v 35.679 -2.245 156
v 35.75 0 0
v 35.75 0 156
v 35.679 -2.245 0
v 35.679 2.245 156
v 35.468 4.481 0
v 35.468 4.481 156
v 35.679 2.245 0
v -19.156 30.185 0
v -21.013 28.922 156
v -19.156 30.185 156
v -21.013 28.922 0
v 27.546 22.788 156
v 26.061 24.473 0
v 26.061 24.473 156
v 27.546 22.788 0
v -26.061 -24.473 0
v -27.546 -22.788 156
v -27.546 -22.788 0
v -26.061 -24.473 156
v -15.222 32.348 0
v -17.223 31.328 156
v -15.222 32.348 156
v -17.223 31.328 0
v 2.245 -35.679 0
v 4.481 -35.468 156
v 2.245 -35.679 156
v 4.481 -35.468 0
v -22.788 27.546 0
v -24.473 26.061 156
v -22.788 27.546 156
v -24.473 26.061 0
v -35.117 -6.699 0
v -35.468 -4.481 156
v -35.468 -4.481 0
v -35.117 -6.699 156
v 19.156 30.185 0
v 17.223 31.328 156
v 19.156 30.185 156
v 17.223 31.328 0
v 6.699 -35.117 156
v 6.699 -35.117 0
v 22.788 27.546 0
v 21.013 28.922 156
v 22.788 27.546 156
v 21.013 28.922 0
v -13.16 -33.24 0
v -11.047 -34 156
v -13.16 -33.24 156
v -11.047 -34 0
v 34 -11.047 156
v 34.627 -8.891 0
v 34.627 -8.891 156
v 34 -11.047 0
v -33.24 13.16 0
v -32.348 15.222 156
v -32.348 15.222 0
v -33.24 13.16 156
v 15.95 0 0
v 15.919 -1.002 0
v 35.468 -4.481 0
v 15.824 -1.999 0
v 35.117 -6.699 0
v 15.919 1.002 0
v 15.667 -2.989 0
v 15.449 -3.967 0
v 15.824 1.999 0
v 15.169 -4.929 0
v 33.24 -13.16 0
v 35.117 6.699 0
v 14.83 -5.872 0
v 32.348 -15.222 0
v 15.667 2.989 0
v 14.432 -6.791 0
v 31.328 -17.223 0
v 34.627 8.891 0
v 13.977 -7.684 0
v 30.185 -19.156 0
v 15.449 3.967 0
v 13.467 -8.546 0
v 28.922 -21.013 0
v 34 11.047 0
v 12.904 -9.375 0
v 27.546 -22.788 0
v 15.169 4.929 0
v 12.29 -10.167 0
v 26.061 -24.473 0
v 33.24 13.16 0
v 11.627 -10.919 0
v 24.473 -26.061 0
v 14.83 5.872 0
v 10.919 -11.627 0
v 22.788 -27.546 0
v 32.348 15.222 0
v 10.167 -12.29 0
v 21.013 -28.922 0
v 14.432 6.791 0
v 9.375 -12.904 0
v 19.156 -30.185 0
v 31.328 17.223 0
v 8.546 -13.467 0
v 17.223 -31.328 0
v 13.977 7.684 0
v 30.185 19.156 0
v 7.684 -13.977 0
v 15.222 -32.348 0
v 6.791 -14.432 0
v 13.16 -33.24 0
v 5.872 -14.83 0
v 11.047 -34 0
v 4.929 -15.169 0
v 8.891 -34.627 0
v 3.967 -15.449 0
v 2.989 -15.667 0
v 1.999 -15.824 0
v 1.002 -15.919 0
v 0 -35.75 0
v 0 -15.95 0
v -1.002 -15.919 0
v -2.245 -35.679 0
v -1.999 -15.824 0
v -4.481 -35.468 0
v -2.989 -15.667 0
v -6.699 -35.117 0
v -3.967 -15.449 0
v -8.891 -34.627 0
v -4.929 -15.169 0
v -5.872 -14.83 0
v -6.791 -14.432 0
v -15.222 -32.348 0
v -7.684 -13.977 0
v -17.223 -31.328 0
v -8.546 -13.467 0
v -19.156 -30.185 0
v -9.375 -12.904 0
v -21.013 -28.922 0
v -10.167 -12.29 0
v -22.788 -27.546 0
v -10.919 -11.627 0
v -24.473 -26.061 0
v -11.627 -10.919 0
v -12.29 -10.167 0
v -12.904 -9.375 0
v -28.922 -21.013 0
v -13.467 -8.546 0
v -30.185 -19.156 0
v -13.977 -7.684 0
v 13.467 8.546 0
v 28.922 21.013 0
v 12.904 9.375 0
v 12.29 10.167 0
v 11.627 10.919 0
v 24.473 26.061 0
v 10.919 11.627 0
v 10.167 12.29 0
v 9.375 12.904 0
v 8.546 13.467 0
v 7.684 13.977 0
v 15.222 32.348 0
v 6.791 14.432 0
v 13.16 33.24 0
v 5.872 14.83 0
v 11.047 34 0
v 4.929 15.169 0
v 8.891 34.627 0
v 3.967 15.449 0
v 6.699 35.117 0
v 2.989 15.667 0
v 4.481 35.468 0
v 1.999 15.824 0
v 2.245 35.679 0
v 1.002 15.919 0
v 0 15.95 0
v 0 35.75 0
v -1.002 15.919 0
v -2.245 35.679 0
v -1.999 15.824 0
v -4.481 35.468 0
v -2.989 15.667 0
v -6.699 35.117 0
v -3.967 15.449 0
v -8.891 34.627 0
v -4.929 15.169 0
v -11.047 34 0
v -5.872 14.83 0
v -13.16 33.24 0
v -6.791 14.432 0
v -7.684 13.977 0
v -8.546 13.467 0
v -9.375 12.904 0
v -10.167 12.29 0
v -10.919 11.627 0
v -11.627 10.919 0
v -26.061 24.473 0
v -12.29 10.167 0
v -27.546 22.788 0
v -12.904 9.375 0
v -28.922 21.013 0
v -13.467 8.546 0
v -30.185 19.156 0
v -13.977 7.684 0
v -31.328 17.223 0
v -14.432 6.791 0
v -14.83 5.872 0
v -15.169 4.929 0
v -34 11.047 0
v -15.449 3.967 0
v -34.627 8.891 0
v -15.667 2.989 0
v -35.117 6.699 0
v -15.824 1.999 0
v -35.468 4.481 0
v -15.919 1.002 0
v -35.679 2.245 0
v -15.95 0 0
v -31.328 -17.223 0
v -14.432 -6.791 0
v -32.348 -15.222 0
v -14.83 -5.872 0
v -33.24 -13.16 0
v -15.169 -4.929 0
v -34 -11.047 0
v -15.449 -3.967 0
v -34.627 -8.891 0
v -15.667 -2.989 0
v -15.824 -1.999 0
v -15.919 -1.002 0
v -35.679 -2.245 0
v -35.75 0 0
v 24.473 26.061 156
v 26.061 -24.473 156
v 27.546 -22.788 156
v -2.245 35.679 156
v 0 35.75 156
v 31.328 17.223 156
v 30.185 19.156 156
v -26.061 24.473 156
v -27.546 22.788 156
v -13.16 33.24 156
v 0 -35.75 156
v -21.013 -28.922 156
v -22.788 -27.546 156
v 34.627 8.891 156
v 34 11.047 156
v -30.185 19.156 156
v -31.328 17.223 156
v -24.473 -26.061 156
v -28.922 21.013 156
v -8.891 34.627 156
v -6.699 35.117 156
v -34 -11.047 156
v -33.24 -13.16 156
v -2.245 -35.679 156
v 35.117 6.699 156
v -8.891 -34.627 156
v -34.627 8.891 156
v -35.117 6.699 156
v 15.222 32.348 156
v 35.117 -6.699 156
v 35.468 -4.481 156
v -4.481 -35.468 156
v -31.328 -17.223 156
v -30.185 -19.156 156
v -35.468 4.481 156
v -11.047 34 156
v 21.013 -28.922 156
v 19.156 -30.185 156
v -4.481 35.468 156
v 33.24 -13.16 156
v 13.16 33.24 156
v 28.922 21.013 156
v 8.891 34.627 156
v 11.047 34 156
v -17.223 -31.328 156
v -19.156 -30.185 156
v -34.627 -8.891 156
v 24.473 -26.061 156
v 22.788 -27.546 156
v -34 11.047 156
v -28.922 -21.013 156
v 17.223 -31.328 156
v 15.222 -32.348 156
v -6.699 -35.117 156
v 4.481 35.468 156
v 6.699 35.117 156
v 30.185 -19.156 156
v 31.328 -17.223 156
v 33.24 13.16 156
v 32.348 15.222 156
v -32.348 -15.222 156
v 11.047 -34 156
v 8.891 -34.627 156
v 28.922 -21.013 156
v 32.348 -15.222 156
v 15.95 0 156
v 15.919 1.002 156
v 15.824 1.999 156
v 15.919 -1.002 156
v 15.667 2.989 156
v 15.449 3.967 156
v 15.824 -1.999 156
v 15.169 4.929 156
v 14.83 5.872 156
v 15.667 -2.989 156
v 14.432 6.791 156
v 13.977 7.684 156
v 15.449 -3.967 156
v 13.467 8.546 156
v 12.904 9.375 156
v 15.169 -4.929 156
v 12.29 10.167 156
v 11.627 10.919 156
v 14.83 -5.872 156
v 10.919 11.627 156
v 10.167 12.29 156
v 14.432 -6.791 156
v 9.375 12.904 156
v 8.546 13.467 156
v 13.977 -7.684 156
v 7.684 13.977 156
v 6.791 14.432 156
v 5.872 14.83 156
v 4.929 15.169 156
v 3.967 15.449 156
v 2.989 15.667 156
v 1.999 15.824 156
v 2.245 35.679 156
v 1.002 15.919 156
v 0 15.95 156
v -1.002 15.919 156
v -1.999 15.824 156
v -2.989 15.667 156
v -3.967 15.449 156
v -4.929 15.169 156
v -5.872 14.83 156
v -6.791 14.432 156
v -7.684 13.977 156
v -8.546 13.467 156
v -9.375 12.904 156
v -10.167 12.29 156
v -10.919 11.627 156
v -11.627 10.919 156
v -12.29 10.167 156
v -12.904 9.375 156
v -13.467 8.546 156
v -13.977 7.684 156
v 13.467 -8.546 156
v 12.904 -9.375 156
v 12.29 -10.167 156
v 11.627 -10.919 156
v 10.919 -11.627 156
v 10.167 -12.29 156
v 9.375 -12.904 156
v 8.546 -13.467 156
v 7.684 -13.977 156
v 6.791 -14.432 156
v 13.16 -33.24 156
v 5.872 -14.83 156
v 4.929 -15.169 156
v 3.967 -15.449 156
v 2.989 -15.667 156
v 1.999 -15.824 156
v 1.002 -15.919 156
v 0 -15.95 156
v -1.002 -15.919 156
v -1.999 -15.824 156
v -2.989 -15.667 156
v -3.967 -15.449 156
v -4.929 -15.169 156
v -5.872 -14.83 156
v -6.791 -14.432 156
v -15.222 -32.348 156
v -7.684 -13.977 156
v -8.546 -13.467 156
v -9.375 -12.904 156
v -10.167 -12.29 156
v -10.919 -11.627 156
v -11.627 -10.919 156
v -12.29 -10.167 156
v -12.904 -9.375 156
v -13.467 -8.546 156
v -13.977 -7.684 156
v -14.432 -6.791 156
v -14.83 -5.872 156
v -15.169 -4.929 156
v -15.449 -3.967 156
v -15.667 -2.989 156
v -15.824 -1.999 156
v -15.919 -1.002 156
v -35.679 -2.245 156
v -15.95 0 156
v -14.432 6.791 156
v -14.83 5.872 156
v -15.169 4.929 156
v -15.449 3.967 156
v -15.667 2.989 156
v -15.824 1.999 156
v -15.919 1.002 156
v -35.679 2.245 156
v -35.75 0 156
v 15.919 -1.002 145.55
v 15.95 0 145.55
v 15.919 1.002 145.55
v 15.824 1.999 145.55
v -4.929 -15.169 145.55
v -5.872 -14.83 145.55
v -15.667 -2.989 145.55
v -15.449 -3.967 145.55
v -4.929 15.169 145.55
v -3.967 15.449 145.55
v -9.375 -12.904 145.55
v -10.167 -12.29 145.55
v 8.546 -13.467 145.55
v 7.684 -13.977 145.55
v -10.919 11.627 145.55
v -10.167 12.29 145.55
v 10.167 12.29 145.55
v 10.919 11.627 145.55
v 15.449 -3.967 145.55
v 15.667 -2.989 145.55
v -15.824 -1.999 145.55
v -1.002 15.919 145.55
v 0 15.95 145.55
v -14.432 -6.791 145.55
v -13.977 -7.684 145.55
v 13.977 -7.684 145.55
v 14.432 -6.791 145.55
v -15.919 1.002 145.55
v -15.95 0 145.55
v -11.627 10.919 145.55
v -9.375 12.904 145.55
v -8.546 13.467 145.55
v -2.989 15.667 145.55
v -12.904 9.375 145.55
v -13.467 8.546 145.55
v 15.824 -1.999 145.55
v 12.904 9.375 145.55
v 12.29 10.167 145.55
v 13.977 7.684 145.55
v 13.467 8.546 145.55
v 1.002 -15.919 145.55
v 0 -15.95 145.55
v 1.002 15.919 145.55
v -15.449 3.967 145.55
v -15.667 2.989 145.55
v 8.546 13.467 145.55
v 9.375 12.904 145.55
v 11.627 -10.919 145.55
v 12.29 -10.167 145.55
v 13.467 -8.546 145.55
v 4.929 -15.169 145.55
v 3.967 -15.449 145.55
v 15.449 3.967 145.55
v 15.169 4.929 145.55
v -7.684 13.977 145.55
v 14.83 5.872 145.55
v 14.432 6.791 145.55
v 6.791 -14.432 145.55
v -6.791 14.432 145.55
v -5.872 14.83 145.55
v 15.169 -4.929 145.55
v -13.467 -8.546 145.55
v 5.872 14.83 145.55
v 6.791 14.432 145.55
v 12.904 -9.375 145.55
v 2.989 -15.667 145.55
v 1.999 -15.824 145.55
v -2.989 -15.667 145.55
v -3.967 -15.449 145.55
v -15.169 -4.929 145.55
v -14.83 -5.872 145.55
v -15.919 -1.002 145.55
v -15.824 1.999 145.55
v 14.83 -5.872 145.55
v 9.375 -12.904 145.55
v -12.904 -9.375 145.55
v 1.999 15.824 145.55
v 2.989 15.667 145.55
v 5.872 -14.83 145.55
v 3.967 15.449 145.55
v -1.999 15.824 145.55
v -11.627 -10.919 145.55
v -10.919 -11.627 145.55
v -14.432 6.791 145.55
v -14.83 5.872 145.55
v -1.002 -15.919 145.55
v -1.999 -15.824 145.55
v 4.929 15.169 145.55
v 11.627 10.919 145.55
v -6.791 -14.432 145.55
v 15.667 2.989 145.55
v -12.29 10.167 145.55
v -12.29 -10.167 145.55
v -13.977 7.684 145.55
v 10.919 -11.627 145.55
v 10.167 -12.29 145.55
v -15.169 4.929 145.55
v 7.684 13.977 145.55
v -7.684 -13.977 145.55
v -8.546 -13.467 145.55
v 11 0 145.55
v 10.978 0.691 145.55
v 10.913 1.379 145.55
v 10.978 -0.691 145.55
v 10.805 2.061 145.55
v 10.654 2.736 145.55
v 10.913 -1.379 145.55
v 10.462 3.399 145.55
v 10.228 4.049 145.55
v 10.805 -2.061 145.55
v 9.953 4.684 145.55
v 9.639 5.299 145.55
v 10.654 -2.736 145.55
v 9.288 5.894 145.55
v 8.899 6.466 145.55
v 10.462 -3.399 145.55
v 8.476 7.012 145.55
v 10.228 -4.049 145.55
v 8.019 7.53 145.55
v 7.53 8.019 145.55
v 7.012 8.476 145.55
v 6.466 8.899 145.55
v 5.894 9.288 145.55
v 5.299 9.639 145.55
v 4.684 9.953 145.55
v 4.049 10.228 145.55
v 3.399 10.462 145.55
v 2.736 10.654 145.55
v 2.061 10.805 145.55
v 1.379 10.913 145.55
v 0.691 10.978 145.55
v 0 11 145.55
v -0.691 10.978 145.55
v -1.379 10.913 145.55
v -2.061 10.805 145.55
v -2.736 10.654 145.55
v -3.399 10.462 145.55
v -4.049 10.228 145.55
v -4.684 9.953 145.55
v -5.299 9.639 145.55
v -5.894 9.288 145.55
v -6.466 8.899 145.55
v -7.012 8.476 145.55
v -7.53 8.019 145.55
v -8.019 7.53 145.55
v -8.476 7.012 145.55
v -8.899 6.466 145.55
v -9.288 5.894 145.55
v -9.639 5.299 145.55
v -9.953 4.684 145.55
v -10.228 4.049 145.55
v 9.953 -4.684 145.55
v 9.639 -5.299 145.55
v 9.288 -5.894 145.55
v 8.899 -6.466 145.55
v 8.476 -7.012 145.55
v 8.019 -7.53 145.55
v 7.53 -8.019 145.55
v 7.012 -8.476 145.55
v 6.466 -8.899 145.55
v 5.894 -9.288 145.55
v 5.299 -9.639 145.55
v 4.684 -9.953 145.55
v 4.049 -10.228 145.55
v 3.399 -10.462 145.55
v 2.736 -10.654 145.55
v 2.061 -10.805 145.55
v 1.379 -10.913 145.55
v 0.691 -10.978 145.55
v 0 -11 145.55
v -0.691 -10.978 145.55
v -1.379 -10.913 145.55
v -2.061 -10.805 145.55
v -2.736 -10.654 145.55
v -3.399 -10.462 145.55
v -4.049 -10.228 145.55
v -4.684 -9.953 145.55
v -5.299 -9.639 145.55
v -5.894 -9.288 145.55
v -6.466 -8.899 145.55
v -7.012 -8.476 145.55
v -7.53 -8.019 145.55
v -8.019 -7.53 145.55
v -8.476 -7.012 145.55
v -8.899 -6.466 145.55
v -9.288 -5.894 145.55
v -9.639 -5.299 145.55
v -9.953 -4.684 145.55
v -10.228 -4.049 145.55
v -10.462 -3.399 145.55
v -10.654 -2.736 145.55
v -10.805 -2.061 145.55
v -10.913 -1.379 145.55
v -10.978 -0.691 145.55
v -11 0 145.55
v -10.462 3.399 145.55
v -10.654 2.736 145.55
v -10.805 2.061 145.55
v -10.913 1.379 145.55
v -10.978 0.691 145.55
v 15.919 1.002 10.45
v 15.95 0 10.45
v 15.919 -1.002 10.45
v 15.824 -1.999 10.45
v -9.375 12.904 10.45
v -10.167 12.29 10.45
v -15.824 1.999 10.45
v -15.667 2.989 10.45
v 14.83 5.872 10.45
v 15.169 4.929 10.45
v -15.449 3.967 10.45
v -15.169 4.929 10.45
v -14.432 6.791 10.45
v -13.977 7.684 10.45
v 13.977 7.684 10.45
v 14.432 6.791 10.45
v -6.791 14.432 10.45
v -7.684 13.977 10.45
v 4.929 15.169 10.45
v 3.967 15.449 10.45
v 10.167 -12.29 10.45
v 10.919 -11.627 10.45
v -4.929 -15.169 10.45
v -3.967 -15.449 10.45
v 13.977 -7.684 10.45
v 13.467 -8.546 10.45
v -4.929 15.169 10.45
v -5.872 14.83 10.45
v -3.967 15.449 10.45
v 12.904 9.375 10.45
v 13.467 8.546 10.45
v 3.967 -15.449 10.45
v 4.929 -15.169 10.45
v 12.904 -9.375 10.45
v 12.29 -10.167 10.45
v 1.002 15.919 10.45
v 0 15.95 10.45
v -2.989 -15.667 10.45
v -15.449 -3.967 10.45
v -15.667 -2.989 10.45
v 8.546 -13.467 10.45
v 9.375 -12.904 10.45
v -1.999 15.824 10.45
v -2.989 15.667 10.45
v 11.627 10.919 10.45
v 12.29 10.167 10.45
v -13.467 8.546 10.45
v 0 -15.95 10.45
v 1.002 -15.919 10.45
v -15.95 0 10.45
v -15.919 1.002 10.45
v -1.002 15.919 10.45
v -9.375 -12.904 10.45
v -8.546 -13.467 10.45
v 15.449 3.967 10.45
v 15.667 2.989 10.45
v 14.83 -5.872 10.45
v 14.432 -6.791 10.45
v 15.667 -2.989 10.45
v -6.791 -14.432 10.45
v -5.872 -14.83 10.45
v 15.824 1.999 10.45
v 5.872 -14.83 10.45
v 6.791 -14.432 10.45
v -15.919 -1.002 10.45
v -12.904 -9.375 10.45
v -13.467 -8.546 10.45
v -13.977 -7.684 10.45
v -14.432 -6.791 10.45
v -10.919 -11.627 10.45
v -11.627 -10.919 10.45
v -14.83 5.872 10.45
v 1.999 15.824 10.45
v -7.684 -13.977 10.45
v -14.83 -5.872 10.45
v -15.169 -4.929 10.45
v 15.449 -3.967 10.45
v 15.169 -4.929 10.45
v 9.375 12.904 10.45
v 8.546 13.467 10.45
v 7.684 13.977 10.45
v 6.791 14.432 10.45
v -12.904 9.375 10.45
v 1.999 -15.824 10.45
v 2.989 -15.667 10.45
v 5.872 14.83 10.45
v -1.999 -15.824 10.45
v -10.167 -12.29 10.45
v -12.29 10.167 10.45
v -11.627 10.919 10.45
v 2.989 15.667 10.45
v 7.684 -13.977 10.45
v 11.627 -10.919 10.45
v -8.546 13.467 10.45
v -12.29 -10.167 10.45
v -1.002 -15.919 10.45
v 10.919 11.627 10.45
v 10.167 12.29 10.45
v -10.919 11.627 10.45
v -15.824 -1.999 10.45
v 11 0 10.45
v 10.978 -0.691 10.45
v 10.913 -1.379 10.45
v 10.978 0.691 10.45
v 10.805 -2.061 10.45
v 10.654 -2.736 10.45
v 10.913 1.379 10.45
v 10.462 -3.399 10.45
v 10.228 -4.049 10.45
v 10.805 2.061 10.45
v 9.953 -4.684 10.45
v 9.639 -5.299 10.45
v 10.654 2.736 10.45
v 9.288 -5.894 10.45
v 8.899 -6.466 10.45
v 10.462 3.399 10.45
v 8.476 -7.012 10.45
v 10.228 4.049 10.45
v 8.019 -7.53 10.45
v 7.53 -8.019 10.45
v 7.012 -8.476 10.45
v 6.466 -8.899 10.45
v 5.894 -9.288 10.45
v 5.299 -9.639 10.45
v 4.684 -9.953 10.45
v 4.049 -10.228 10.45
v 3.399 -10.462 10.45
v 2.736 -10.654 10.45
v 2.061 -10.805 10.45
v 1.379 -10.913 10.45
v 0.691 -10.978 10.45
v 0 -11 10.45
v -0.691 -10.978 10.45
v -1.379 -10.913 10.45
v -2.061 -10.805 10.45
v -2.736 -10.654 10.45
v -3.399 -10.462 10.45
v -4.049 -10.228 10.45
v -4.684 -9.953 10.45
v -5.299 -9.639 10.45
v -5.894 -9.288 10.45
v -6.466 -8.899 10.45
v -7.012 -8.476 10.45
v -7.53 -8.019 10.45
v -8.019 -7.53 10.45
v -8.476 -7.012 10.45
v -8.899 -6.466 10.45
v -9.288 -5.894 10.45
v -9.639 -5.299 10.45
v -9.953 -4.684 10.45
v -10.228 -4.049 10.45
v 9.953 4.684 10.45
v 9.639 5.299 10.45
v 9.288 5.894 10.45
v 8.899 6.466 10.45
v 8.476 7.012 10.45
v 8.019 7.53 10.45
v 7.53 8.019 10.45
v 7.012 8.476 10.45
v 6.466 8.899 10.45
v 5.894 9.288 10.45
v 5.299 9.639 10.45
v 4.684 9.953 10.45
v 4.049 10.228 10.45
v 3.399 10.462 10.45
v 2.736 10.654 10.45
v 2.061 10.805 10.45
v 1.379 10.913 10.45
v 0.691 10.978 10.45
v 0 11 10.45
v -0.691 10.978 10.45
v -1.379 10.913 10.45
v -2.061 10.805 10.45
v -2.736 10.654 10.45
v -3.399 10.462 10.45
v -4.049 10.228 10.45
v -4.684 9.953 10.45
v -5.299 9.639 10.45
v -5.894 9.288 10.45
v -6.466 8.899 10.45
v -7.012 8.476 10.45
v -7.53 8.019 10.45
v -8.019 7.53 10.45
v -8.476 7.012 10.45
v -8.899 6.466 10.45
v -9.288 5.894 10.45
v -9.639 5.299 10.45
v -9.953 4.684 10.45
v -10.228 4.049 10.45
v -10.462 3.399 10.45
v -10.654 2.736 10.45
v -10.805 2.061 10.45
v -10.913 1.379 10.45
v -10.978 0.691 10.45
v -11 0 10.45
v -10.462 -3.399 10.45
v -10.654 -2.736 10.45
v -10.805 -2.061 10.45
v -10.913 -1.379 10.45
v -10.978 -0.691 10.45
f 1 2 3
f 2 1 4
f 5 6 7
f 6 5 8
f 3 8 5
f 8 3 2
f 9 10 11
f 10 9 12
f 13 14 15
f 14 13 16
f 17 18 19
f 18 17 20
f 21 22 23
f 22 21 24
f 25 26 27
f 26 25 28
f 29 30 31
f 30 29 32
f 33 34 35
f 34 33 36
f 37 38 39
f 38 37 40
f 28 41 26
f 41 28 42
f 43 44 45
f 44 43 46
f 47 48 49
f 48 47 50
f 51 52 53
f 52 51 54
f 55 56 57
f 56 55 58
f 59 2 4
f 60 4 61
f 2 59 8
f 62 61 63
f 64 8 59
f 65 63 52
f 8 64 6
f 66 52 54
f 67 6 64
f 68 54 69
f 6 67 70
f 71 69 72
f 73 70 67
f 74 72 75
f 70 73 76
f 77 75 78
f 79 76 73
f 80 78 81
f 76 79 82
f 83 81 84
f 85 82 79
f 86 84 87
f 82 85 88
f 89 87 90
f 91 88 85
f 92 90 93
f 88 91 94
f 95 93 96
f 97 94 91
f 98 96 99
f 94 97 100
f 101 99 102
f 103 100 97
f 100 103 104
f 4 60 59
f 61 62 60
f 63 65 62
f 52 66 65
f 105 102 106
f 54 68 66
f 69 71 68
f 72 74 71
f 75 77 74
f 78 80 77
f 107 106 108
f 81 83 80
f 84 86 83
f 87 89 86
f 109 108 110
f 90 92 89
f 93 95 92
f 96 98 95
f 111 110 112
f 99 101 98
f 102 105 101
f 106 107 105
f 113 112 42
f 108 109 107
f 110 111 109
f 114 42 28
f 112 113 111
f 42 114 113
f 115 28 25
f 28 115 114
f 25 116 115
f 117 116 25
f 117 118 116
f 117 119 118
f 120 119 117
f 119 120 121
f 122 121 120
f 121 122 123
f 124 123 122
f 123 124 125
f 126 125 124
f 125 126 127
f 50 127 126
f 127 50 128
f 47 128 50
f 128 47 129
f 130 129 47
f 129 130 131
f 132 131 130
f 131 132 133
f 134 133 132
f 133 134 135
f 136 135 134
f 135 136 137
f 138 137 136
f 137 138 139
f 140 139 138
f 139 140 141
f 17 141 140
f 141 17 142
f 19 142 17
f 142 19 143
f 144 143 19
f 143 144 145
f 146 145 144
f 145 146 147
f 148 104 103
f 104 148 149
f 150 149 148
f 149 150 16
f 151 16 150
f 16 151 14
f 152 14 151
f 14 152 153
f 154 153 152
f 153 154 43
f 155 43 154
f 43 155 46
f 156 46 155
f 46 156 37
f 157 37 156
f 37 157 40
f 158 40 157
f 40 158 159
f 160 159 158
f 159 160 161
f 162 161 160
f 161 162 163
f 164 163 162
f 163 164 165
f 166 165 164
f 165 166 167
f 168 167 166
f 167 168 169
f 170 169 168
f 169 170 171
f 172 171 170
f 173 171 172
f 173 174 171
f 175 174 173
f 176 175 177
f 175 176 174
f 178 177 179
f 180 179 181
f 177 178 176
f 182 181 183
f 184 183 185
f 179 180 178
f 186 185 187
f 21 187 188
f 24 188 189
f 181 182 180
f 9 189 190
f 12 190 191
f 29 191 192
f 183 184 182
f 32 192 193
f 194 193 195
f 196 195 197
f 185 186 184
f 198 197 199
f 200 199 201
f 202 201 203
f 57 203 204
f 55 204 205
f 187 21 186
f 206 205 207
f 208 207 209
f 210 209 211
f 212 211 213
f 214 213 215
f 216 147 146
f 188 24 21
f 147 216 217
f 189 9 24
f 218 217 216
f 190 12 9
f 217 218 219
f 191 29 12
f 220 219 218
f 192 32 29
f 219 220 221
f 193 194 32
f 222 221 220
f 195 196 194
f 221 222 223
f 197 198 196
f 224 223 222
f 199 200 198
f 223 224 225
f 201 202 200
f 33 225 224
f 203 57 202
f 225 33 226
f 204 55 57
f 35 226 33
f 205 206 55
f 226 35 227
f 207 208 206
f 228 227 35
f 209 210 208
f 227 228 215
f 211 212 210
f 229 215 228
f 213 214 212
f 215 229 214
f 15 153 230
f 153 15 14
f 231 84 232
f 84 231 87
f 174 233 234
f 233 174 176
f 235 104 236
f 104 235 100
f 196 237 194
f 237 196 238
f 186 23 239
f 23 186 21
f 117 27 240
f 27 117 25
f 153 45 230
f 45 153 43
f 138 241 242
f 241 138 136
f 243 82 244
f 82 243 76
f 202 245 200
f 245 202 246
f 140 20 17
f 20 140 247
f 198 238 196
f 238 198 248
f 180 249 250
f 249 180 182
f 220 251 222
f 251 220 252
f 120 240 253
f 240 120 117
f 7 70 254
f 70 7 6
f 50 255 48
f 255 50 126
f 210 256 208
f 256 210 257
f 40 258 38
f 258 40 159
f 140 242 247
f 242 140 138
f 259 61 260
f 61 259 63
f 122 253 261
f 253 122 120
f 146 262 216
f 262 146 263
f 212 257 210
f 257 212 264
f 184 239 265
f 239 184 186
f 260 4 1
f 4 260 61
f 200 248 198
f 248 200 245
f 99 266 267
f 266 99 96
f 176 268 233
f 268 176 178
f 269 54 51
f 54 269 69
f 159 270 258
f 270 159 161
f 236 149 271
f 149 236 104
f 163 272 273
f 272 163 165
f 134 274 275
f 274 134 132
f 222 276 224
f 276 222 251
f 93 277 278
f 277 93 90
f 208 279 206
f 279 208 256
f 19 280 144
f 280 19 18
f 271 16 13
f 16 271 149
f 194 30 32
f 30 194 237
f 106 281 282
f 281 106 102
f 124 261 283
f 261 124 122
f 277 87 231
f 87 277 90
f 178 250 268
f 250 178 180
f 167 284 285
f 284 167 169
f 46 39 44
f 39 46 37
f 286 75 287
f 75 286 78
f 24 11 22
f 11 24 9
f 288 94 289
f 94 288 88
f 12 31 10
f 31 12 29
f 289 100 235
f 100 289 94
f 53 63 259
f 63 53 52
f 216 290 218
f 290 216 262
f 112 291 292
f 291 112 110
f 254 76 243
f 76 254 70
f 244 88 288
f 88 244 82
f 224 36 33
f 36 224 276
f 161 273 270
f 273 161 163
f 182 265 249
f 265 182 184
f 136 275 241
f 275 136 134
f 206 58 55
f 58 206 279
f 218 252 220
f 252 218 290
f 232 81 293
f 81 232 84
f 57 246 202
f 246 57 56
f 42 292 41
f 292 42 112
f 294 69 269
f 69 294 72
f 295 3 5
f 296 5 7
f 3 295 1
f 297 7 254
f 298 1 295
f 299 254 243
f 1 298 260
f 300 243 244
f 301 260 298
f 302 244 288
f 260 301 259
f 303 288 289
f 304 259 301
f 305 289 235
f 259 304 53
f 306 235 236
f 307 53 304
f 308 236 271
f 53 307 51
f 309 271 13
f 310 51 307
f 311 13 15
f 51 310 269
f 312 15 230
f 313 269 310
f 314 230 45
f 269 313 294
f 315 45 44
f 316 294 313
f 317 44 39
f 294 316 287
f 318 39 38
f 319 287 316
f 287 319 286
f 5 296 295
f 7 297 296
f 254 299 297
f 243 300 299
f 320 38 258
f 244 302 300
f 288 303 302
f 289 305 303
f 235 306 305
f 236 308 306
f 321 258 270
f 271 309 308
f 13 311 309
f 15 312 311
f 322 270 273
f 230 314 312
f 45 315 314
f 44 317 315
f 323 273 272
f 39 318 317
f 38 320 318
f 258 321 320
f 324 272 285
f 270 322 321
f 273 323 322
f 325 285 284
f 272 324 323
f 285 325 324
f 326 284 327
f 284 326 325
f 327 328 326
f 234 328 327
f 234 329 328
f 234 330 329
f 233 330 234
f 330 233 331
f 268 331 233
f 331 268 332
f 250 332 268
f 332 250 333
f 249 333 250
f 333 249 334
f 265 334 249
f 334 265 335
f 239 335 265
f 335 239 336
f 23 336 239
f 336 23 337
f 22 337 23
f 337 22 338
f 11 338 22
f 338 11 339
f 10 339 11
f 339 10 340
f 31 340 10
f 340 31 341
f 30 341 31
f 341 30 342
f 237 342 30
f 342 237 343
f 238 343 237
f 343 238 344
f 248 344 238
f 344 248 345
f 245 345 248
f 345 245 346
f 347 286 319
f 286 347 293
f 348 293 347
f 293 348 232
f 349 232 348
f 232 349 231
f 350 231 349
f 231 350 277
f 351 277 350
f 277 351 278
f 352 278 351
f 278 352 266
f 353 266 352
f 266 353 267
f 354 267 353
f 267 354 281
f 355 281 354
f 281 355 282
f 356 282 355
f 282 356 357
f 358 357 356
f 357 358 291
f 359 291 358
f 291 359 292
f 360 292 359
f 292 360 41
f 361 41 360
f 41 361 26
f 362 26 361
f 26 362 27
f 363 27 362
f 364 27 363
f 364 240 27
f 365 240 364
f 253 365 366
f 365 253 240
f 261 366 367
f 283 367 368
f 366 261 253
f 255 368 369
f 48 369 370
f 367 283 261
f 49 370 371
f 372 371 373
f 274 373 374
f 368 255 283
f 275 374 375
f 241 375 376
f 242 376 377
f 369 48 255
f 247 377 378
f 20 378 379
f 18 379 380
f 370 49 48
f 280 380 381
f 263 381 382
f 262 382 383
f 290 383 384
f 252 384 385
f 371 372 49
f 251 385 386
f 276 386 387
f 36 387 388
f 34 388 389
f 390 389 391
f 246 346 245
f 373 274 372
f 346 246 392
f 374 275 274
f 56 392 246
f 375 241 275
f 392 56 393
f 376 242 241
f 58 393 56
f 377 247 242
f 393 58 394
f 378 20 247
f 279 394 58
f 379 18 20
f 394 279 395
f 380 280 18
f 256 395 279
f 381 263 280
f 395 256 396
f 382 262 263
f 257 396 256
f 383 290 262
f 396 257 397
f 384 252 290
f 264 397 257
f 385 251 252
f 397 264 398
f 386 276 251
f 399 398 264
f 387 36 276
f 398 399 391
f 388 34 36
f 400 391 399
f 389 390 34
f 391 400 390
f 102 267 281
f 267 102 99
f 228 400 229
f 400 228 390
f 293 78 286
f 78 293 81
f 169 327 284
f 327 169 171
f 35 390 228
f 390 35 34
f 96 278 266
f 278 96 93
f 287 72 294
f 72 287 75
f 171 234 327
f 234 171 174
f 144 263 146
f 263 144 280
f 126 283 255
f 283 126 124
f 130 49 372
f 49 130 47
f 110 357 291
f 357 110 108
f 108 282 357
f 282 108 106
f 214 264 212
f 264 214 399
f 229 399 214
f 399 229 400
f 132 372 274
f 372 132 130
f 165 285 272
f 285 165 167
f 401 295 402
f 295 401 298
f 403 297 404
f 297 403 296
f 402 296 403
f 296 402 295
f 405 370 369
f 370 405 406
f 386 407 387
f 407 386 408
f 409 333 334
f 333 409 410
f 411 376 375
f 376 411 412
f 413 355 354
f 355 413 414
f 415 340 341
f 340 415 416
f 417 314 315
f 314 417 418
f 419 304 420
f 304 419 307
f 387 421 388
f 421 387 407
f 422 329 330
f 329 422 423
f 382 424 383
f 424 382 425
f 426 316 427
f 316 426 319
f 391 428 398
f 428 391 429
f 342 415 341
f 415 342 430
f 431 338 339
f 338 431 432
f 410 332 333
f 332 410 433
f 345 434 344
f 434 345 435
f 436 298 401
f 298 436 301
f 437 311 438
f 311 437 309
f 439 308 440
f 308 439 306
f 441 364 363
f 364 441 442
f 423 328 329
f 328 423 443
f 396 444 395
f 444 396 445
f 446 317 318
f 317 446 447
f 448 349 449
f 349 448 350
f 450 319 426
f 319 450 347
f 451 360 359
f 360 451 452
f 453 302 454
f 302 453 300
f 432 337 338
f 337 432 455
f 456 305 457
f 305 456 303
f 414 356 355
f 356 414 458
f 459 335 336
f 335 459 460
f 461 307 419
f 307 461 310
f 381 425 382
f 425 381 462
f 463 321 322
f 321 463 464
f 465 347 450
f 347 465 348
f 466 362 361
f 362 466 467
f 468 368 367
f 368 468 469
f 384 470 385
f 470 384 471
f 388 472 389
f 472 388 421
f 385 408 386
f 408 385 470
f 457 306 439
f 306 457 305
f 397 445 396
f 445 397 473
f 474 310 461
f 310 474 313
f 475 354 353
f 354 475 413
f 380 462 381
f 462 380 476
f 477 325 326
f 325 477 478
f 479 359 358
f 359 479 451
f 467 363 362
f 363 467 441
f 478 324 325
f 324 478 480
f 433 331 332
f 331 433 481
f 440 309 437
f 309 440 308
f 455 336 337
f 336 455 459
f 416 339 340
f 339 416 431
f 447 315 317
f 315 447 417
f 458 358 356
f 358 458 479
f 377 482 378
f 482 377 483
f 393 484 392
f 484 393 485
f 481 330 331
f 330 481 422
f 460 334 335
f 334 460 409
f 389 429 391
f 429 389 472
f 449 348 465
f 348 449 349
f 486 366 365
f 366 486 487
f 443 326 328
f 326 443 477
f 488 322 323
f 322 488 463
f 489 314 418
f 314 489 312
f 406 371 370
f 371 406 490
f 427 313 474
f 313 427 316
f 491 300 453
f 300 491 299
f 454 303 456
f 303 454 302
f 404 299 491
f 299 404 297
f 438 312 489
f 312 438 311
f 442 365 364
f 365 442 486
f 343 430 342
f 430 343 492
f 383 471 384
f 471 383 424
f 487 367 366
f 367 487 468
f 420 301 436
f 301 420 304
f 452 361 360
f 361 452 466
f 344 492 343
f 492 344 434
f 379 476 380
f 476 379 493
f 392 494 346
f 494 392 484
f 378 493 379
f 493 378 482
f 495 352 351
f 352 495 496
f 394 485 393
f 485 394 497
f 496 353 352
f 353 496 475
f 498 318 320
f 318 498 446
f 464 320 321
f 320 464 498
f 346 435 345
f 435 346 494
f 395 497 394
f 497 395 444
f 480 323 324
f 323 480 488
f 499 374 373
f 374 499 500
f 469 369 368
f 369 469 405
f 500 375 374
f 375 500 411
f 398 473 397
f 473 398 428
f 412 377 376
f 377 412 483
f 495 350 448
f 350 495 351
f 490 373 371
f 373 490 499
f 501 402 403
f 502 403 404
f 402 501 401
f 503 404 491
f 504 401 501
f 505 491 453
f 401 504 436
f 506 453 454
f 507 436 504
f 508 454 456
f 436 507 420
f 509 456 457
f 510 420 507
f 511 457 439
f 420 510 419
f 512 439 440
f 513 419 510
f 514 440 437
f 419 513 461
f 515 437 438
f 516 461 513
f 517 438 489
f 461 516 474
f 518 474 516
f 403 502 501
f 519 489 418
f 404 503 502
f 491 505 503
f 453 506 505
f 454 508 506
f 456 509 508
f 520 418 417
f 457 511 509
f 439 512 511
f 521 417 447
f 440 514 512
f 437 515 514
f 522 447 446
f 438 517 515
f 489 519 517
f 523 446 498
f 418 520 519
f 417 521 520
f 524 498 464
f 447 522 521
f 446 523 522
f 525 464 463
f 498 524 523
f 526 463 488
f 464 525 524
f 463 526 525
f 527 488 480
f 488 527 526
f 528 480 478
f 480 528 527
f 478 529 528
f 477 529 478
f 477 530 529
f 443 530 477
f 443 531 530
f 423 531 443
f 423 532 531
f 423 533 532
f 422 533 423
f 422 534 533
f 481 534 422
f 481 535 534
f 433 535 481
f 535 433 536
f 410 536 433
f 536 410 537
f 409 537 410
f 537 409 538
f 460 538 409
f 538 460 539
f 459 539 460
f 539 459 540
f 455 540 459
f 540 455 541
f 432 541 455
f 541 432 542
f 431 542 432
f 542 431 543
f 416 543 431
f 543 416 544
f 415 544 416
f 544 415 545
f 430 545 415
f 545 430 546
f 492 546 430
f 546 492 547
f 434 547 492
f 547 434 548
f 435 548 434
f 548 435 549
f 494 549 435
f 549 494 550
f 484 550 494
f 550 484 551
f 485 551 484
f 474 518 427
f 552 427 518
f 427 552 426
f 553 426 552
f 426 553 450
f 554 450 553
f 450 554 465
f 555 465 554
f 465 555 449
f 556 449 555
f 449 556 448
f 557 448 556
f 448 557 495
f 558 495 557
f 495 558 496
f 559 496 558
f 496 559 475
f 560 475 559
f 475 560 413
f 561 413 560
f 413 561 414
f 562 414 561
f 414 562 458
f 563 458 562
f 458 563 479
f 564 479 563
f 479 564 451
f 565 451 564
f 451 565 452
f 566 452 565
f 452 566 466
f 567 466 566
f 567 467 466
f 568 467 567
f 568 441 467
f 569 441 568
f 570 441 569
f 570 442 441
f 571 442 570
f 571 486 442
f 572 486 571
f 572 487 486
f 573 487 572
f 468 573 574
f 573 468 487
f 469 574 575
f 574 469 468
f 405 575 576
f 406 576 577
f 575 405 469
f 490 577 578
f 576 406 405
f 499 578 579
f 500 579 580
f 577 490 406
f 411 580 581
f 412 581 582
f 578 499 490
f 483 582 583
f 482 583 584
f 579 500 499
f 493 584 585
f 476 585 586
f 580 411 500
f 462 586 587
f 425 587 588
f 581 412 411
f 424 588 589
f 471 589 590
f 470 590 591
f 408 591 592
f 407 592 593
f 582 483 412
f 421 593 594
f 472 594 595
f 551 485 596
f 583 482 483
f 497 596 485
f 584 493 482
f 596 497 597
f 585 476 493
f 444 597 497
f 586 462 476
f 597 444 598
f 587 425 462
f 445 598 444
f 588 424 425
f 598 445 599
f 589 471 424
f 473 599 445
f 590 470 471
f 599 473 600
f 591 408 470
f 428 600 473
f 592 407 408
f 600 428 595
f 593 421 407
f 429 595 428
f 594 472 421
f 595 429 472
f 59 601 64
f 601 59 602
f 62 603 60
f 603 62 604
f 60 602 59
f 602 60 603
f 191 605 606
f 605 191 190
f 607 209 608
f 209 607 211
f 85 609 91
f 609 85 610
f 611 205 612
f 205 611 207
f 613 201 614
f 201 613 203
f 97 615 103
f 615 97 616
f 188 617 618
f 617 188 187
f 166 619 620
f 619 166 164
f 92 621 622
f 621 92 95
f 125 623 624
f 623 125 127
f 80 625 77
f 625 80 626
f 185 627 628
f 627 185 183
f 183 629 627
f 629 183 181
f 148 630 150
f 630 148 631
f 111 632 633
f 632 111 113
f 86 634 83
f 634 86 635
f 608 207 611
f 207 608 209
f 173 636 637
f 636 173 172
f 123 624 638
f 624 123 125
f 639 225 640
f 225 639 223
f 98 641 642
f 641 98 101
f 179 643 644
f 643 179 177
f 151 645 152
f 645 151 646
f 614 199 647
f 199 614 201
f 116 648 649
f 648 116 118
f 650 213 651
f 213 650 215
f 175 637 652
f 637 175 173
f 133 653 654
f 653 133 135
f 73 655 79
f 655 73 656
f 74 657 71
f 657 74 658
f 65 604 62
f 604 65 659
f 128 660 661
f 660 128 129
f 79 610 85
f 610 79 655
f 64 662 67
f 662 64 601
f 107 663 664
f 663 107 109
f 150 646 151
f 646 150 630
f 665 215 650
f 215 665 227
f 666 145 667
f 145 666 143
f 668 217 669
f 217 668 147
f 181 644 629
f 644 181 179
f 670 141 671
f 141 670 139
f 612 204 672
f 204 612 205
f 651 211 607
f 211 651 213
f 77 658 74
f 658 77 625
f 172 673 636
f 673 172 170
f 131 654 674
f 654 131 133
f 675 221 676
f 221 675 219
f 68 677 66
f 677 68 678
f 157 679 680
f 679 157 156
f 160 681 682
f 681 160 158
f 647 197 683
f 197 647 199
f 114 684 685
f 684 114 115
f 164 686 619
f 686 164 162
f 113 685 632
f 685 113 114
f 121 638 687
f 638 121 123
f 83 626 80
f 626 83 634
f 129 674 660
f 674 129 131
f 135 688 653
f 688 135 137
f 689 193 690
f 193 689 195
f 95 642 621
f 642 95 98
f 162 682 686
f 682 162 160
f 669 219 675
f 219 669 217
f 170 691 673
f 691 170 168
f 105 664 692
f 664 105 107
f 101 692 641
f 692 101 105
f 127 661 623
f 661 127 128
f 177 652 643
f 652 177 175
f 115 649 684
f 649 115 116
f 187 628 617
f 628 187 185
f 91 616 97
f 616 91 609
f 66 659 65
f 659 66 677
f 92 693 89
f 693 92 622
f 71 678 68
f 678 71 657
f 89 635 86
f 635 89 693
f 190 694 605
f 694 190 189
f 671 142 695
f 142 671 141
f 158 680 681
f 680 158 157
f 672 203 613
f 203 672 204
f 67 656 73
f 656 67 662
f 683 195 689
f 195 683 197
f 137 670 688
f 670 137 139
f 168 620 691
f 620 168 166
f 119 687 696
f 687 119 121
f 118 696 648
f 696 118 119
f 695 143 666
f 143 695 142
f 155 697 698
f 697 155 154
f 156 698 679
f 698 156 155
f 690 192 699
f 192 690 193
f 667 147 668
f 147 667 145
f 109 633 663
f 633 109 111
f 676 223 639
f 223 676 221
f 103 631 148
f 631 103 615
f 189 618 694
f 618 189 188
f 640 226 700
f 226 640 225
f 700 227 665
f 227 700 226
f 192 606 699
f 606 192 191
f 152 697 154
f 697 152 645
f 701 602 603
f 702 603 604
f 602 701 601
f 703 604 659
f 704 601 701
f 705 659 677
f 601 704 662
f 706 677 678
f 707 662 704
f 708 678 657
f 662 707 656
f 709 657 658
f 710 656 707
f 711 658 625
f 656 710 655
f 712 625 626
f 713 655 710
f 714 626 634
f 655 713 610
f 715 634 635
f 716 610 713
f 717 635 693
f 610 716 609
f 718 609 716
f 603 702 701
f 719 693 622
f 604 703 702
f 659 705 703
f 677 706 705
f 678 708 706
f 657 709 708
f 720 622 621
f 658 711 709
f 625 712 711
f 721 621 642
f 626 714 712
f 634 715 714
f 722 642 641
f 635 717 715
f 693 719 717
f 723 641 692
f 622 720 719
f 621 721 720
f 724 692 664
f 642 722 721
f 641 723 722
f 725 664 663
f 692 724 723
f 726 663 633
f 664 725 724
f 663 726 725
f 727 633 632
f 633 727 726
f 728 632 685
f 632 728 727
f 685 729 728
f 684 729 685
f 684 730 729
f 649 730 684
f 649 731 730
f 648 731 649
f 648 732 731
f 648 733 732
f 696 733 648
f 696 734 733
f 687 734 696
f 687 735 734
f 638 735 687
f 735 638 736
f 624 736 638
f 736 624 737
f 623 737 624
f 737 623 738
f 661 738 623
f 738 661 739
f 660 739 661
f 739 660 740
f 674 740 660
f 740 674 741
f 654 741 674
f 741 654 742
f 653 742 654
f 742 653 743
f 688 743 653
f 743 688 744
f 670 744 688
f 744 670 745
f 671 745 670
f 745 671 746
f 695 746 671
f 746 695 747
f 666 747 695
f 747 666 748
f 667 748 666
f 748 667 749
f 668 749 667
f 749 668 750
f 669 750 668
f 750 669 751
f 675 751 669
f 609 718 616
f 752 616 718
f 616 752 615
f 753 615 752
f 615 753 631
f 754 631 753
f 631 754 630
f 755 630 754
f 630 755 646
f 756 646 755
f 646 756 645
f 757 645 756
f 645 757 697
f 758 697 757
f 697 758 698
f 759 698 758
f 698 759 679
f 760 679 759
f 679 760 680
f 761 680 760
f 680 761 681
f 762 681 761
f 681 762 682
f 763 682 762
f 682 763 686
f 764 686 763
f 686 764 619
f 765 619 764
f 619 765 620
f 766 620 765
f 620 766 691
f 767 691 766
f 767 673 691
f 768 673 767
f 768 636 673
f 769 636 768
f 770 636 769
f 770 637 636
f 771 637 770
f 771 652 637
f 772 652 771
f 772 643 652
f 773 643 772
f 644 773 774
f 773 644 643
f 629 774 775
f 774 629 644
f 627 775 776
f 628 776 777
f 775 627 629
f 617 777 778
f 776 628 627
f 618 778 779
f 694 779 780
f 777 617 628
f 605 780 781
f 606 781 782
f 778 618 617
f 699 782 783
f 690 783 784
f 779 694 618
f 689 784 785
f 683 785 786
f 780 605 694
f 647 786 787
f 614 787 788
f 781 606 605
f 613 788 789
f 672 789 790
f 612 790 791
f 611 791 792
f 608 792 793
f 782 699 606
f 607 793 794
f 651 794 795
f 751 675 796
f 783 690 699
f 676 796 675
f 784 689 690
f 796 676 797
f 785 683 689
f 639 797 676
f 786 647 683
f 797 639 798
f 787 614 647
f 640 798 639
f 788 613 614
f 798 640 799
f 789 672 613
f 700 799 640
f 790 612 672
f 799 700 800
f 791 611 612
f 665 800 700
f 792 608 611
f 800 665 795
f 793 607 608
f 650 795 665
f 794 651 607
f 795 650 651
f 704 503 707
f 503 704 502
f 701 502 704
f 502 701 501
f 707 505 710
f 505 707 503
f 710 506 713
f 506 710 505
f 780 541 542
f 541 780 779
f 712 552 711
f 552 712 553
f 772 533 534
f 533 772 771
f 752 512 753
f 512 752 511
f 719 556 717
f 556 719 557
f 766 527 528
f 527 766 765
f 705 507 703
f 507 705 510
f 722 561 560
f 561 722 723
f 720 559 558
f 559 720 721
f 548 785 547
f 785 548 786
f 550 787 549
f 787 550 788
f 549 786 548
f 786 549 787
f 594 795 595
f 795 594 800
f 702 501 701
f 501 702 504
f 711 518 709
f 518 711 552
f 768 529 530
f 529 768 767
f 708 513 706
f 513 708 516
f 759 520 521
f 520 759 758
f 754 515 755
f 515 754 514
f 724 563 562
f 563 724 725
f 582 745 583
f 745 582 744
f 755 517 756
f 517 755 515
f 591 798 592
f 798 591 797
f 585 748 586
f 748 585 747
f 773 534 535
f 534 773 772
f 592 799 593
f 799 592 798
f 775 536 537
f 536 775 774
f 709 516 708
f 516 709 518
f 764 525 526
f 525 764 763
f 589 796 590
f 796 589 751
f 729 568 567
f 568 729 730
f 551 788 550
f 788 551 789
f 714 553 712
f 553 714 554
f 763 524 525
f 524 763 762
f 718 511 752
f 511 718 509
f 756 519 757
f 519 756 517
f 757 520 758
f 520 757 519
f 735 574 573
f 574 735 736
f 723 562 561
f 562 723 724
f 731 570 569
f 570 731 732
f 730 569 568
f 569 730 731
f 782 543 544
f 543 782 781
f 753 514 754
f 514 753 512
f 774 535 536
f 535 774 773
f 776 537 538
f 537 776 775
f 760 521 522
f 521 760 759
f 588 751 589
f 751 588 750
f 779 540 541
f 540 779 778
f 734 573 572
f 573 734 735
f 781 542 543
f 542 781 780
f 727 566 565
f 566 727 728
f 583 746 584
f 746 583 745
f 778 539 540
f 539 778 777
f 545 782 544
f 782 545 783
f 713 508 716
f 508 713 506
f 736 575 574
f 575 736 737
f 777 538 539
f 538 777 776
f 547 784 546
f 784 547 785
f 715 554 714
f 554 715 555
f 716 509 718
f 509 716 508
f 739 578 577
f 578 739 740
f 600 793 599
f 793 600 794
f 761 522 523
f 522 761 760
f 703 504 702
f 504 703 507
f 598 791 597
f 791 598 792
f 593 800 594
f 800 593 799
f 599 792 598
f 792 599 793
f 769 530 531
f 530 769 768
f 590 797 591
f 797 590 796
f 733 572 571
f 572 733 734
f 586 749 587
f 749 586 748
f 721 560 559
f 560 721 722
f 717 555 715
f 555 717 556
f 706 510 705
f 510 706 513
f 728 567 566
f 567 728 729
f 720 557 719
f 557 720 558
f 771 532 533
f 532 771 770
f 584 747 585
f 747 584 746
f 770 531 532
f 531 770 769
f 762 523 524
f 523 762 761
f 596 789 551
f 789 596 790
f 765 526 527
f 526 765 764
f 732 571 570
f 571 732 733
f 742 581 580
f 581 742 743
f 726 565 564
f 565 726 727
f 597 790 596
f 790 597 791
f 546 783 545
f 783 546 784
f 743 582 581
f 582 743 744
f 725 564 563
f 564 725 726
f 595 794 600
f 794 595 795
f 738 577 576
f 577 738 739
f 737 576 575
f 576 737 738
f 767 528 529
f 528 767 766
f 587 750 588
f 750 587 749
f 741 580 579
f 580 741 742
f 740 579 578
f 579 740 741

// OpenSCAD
$fn = 100;

roller_diameter = 71.5;
roller_radius = roller_diameter / 2.0;
roller_height = 156;

bearing_inset_depth = 10.5;
bearing_inset_diameter = 31.9;
bearing_inset_radius = bearing_inset_diameter / 2.0;

center_hole_diameter = 22;
center_hole_radius = center_hole_diameter / 2.0;

difference() {
    cylinder(h  = roller_height, r = roller_radius);
    
    translate([0, 0, roller_height - bearing_inset_depth + 0.05]) {
        bearing_inset();
    }
    
    translate([0, 0, bearing_inset_depth - 0.05]) {
            rotate([180, 0, 0]) {
            bearing_inset();
        }
    }
    
    cylinder(h = roller_height, r = center_hole_radius);
}   

module bearing_inset() {
    chamfer_height = 0.5;
    
    
    union() {
        cylinder(h = bearing_inset_depth - 0.01, r = bearing_inset_radius);
        
        // Chamfer
        //translate([0, 0, bearing_inset_depth - chamfer_height - 0.01]) {
        //    cylinder(chamfer_height + 0.01, bearing_inset_radius, bearing_inset_radius * 1.2);  
        //}  
    }
    
}
